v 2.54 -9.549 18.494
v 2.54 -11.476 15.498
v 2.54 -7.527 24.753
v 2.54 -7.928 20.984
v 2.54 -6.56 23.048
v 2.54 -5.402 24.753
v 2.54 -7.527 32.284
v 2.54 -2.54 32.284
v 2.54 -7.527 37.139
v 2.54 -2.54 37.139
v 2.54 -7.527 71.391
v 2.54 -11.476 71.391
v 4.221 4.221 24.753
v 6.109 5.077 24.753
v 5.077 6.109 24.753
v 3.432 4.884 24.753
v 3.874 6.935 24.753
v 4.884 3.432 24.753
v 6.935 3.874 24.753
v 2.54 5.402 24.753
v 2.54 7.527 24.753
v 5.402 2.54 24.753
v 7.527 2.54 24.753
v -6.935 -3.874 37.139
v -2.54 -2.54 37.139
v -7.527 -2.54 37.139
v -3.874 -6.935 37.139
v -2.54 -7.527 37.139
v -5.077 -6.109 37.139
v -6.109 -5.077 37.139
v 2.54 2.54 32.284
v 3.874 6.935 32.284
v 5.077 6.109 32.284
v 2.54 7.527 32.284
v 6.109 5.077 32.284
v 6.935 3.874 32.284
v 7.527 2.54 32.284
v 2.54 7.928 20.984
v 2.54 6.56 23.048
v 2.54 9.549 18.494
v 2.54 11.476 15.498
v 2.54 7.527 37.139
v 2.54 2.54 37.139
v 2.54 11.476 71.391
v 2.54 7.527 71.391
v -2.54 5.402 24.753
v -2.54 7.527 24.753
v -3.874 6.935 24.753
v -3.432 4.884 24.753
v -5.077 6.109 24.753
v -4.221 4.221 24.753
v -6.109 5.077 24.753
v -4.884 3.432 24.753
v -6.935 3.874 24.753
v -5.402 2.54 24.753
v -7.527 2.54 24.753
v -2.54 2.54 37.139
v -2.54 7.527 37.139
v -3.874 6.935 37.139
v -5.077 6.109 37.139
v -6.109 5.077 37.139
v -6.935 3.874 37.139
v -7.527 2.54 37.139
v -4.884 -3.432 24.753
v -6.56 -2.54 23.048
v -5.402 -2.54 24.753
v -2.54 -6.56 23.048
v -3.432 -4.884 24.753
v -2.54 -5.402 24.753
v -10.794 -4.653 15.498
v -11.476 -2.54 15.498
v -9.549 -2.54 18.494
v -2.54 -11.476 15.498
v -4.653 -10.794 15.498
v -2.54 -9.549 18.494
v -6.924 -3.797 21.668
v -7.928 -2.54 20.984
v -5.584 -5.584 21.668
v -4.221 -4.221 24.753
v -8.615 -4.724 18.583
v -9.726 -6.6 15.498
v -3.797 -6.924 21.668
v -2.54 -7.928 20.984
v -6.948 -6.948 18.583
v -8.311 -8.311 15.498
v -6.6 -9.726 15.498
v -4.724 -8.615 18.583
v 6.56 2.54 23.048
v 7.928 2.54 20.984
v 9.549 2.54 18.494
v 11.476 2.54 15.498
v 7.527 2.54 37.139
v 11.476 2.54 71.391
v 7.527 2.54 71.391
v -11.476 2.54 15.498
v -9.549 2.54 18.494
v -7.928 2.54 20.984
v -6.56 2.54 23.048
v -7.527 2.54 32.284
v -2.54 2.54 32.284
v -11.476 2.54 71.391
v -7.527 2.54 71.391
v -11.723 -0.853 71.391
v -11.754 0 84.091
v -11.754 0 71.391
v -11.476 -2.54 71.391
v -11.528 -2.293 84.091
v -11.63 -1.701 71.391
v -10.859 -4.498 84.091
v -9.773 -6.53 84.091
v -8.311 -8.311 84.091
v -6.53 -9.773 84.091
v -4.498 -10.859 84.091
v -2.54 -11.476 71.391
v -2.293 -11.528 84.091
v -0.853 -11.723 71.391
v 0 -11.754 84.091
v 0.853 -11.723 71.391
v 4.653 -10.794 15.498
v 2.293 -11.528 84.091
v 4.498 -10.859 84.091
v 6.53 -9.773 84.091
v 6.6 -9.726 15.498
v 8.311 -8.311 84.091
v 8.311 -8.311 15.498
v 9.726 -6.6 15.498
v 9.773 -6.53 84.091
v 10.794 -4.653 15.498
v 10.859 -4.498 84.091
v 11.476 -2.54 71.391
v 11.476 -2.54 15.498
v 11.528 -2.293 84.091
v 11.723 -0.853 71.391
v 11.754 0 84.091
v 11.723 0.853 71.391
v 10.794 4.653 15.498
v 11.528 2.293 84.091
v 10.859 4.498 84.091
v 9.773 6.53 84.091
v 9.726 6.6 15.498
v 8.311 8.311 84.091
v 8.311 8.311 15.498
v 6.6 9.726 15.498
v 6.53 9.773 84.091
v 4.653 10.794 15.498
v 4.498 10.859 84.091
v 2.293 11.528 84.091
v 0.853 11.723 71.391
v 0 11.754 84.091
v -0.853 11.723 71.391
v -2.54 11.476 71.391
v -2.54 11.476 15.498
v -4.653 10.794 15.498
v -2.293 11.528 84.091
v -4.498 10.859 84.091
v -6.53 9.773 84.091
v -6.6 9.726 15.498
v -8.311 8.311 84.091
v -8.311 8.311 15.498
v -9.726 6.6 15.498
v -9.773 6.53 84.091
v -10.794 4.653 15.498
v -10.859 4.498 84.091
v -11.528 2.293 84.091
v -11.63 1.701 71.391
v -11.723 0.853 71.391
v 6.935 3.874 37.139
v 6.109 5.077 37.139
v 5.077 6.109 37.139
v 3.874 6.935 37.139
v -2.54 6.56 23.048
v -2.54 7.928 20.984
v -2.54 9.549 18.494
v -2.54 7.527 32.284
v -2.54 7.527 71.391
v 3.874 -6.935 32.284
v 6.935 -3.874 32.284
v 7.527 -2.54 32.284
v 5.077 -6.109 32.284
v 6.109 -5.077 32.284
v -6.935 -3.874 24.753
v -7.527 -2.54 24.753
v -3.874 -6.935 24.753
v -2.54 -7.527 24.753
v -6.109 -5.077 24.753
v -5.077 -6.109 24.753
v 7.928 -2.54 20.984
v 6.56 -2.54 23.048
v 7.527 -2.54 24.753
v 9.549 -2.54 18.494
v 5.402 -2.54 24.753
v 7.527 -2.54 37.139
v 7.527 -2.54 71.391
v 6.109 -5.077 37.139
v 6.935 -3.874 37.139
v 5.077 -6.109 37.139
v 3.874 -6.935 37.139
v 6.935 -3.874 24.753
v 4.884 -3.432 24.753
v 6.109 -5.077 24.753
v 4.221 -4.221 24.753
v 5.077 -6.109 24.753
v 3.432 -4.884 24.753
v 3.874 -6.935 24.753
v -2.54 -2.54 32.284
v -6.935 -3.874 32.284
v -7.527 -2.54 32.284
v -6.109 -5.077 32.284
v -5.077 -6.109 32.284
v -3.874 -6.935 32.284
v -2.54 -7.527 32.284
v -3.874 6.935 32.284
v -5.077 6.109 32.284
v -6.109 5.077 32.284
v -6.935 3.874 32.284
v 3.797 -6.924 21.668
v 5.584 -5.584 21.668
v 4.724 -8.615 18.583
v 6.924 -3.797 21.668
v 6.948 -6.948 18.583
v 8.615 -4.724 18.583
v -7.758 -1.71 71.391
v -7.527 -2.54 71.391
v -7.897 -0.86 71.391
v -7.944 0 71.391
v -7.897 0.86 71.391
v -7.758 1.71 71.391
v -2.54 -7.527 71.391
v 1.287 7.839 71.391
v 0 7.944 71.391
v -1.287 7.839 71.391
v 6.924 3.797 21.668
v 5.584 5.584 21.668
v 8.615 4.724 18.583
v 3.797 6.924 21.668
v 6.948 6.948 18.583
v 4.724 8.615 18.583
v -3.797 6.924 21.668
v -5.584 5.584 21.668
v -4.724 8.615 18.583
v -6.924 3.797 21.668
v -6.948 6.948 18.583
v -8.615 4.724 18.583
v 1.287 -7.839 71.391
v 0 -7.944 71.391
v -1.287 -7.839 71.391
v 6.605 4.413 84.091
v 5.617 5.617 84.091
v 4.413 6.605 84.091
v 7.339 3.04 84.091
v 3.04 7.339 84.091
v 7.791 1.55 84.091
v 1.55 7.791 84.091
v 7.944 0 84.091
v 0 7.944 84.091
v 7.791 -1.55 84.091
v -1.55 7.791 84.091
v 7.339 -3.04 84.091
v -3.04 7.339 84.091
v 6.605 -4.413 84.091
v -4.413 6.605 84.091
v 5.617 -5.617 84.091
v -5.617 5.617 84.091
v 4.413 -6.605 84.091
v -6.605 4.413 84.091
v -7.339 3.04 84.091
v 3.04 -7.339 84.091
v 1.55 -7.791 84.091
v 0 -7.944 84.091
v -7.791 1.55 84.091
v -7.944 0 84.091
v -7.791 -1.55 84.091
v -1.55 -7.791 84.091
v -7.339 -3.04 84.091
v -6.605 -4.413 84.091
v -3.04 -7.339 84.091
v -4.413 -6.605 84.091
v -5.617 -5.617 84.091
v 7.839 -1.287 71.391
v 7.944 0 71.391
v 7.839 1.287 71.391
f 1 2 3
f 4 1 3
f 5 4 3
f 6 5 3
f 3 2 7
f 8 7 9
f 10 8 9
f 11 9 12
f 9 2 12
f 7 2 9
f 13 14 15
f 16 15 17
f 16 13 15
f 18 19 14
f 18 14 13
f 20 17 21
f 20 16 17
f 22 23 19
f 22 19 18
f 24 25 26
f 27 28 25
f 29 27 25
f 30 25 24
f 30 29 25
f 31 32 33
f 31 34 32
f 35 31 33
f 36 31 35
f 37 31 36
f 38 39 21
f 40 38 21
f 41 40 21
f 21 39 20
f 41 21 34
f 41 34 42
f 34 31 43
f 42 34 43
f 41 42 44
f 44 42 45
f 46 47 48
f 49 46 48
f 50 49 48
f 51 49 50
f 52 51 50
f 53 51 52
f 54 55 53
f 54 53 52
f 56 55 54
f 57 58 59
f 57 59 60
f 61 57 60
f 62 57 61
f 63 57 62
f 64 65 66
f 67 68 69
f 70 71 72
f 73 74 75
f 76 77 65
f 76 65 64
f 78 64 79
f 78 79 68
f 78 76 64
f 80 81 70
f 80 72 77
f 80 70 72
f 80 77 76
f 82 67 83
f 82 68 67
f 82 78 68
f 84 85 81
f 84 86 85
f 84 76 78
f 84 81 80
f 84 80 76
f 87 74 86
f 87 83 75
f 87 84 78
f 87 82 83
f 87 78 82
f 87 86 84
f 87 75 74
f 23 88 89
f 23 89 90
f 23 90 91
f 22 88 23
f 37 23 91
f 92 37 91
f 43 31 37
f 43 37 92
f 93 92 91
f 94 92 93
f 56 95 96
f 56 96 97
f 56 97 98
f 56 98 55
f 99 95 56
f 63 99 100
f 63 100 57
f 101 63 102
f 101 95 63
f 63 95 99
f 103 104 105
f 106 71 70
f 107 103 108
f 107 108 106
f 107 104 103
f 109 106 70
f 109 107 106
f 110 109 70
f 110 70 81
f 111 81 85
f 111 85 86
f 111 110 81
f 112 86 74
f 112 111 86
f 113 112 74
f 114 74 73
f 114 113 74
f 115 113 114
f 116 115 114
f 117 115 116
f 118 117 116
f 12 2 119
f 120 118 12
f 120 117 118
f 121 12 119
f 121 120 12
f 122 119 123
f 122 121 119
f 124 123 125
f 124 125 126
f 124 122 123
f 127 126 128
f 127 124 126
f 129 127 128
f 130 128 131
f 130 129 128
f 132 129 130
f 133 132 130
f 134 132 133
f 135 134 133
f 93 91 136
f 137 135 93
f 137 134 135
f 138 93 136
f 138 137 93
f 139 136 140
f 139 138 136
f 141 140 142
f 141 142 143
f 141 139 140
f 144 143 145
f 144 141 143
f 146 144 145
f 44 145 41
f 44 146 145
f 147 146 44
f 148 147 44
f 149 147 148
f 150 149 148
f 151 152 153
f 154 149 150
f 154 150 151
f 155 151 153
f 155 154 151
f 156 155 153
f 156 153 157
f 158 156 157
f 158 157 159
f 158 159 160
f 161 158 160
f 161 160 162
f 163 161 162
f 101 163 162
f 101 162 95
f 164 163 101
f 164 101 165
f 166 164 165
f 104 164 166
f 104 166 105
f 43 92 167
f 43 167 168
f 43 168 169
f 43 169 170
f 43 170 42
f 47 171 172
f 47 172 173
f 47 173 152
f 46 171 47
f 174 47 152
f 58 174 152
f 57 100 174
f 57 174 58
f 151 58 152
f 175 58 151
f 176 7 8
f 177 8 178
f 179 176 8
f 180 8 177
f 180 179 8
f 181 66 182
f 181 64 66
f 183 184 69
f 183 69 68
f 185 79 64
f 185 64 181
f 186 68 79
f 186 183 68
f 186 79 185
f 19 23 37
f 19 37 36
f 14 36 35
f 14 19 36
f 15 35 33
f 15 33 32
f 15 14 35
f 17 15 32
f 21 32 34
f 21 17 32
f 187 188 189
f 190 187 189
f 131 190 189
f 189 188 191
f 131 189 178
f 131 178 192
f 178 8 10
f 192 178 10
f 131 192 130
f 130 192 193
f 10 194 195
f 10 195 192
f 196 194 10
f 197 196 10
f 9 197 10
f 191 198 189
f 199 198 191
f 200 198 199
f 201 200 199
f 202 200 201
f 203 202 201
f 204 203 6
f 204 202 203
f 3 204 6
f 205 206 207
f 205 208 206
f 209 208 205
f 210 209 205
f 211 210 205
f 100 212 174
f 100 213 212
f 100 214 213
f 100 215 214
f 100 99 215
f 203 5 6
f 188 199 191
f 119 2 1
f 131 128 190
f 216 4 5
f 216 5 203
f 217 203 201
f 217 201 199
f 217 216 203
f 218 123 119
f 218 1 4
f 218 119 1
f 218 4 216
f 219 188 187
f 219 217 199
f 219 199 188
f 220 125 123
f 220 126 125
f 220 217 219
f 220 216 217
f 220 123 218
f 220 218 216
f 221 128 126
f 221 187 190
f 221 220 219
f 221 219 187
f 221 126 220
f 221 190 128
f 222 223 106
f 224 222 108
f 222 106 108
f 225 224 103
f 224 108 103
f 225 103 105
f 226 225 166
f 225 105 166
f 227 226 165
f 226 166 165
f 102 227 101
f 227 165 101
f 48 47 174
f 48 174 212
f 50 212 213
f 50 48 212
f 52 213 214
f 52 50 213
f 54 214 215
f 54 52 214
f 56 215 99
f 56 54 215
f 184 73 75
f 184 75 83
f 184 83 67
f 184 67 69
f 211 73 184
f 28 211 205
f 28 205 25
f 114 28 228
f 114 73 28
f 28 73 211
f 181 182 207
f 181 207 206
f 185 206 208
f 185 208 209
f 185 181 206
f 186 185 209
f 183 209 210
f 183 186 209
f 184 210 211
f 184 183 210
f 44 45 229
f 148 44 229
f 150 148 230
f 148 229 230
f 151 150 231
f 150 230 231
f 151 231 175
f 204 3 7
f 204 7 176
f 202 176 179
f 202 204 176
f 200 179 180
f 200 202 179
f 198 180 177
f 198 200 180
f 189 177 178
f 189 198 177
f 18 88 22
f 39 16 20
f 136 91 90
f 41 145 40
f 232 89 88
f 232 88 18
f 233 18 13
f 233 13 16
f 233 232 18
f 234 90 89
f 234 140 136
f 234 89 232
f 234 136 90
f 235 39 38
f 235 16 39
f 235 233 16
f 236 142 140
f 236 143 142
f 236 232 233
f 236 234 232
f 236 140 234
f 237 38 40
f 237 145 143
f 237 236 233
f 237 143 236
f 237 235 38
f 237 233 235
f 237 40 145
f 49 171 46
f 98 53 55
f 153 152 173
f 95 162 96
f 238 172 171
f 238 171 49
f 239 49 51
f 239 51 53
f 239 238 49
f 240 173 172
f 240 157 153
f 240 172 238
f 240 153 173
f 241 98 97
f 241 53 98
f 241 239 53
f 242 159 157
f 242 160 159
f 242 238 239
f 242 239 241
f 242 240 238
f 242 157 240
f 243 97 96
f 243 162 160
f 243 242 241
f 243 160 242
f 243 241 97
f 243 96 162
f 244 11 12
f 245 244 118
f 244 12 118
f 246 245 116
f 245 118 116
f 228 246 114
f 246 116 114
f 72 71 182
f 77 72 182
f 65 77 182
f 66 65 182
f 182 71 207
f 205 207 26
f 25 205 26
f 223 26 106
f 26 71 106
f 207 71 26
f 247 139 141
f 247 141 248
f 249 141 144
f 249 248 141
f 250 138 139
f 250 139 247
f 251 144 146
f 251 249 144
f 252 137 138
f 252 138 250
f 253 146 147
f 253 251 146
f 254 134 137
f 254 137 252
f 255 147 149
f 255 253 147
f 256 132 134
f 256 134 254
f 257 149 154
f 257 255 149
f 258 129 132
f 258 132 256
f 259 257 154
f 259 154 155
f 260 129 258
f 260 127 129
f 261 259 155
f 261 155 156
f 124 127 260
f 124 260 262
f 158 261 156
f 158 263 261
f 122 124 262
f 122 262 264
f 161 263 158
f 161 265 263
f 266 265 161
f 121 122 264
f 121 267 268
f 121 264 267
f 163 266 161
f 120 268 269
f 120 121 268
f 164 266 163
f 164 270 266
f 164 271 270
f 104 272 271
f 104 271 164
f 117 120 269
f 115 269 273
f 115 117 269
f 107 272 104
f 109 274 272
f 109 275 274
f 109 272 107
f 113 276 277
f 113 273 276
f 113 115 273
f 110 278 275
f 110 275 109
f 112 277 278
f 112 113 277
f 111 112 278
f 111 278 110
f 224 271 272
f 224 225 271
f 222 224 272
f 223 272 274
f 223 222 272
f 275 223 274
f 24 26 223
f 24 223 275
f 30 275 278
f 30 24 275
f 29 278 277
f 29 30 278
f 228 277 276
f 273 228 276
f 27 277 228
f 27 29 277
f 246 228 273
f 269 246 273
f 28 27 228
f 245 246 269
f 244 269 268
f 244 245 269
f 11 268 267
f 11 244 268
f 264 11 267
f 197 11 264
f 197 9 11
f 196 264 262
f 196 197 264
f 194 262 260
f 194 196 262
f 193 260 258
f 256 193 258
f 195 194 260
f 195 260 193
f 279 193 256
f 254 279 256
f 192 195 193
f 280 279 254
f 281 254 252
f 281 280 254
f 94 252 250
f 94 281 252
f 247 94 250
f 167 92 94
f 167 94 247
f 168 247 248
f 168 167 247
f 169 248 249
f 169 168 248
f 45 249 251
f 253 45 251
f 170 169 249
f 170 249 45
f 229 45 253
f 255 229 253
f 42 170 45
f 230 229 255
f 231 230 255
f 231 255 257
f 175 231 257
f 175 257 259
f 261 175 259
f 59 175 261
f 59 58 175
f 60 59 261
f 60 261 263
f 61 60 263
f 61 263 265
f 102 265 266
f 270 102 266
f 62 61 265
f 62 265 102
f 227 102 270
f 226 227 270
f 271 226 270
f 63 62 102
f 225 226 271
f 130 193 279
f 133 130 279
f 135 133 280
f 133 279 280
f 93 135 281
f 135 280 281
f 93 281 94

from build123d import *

# Parameters (mm, degrees)
CUT_EXTRUDE1_DEPTH      = 86.717666245
CUT_EXTRUDE1_DEPTH_BACK = 86.717666245
SKETCH7_W               = 5.08
SKETCH7_H               = 55.892291628
CUT_EXTRUDE2_DEPTH      = 86.717666245
CUT_EXTRUDE2_DEPTH_BACK = 86.717666245
SKETCH8_W               = 5.08
SKETCH8_H               = 55.892291628


with BuildPart() as part:
    # Sketch4 → Revolve1 (revolve)
    with BuildSketch(Plane.YZ, mode=Mode.PRIVATE) as revolve1_sk:
        Polygon((11.75385, 15.498209184), (11.75385, 84.090500812), (7.94385, 84.090500812), (7.94385, 37.139237028), (3.258679023, 37.139237028), (3.258679023, 32.283867455), (7.94385, 32.283867455), (7.94385, 24.752767455), (5.969, 24.752767455), align=None)
    revolve(revolve1_sk.sketch.rotate(Axis((0, 0, -23.885554531), (0, 0, 1)), 90), axis=Axis((0, 0, -23.885554531), (0, 0, 1)))

    # Sketch7 → Cut-Extrude1 (cut, two sides: drawn at the far end of the back side and taken through both)
    with BuildSketch(Plane.YZ.offset(-CUT_EXTRUDE1_DEPTH_BACK)):
        with Locations((0, 43.444354998)):
            Rectangle(SKETCH7_W, SKETCH7_H)
    extrude(amount=CUT_EXTRUDE1_DEPTH + CUT_EXTRUDE1_DEPTH_BACK, mode=Mode.SUBTRACT)

    # Sketch8 → Cut-Extrude2 (cut, two sides: drawn at the far end of the back side and taken through both)
    with BuildSketch(Plane(origin=(0, 0, 0), x_dir=(-1, 0, 0), z_dir=(0, 1, 0)).offset(-CUT_EXTRUDE2_DEPTH_BACK)):
        with Locations((0, 43.444354998)):
            Rectangle(SKETCH8_W, SKETCH8_H)
    extrude(amount=CUT_EXTRUDE2_DEPTH + CUT_EXTRUDE2_DEPTH_BACK, mode=Mode.SUBTRACT)


solid = part.part
